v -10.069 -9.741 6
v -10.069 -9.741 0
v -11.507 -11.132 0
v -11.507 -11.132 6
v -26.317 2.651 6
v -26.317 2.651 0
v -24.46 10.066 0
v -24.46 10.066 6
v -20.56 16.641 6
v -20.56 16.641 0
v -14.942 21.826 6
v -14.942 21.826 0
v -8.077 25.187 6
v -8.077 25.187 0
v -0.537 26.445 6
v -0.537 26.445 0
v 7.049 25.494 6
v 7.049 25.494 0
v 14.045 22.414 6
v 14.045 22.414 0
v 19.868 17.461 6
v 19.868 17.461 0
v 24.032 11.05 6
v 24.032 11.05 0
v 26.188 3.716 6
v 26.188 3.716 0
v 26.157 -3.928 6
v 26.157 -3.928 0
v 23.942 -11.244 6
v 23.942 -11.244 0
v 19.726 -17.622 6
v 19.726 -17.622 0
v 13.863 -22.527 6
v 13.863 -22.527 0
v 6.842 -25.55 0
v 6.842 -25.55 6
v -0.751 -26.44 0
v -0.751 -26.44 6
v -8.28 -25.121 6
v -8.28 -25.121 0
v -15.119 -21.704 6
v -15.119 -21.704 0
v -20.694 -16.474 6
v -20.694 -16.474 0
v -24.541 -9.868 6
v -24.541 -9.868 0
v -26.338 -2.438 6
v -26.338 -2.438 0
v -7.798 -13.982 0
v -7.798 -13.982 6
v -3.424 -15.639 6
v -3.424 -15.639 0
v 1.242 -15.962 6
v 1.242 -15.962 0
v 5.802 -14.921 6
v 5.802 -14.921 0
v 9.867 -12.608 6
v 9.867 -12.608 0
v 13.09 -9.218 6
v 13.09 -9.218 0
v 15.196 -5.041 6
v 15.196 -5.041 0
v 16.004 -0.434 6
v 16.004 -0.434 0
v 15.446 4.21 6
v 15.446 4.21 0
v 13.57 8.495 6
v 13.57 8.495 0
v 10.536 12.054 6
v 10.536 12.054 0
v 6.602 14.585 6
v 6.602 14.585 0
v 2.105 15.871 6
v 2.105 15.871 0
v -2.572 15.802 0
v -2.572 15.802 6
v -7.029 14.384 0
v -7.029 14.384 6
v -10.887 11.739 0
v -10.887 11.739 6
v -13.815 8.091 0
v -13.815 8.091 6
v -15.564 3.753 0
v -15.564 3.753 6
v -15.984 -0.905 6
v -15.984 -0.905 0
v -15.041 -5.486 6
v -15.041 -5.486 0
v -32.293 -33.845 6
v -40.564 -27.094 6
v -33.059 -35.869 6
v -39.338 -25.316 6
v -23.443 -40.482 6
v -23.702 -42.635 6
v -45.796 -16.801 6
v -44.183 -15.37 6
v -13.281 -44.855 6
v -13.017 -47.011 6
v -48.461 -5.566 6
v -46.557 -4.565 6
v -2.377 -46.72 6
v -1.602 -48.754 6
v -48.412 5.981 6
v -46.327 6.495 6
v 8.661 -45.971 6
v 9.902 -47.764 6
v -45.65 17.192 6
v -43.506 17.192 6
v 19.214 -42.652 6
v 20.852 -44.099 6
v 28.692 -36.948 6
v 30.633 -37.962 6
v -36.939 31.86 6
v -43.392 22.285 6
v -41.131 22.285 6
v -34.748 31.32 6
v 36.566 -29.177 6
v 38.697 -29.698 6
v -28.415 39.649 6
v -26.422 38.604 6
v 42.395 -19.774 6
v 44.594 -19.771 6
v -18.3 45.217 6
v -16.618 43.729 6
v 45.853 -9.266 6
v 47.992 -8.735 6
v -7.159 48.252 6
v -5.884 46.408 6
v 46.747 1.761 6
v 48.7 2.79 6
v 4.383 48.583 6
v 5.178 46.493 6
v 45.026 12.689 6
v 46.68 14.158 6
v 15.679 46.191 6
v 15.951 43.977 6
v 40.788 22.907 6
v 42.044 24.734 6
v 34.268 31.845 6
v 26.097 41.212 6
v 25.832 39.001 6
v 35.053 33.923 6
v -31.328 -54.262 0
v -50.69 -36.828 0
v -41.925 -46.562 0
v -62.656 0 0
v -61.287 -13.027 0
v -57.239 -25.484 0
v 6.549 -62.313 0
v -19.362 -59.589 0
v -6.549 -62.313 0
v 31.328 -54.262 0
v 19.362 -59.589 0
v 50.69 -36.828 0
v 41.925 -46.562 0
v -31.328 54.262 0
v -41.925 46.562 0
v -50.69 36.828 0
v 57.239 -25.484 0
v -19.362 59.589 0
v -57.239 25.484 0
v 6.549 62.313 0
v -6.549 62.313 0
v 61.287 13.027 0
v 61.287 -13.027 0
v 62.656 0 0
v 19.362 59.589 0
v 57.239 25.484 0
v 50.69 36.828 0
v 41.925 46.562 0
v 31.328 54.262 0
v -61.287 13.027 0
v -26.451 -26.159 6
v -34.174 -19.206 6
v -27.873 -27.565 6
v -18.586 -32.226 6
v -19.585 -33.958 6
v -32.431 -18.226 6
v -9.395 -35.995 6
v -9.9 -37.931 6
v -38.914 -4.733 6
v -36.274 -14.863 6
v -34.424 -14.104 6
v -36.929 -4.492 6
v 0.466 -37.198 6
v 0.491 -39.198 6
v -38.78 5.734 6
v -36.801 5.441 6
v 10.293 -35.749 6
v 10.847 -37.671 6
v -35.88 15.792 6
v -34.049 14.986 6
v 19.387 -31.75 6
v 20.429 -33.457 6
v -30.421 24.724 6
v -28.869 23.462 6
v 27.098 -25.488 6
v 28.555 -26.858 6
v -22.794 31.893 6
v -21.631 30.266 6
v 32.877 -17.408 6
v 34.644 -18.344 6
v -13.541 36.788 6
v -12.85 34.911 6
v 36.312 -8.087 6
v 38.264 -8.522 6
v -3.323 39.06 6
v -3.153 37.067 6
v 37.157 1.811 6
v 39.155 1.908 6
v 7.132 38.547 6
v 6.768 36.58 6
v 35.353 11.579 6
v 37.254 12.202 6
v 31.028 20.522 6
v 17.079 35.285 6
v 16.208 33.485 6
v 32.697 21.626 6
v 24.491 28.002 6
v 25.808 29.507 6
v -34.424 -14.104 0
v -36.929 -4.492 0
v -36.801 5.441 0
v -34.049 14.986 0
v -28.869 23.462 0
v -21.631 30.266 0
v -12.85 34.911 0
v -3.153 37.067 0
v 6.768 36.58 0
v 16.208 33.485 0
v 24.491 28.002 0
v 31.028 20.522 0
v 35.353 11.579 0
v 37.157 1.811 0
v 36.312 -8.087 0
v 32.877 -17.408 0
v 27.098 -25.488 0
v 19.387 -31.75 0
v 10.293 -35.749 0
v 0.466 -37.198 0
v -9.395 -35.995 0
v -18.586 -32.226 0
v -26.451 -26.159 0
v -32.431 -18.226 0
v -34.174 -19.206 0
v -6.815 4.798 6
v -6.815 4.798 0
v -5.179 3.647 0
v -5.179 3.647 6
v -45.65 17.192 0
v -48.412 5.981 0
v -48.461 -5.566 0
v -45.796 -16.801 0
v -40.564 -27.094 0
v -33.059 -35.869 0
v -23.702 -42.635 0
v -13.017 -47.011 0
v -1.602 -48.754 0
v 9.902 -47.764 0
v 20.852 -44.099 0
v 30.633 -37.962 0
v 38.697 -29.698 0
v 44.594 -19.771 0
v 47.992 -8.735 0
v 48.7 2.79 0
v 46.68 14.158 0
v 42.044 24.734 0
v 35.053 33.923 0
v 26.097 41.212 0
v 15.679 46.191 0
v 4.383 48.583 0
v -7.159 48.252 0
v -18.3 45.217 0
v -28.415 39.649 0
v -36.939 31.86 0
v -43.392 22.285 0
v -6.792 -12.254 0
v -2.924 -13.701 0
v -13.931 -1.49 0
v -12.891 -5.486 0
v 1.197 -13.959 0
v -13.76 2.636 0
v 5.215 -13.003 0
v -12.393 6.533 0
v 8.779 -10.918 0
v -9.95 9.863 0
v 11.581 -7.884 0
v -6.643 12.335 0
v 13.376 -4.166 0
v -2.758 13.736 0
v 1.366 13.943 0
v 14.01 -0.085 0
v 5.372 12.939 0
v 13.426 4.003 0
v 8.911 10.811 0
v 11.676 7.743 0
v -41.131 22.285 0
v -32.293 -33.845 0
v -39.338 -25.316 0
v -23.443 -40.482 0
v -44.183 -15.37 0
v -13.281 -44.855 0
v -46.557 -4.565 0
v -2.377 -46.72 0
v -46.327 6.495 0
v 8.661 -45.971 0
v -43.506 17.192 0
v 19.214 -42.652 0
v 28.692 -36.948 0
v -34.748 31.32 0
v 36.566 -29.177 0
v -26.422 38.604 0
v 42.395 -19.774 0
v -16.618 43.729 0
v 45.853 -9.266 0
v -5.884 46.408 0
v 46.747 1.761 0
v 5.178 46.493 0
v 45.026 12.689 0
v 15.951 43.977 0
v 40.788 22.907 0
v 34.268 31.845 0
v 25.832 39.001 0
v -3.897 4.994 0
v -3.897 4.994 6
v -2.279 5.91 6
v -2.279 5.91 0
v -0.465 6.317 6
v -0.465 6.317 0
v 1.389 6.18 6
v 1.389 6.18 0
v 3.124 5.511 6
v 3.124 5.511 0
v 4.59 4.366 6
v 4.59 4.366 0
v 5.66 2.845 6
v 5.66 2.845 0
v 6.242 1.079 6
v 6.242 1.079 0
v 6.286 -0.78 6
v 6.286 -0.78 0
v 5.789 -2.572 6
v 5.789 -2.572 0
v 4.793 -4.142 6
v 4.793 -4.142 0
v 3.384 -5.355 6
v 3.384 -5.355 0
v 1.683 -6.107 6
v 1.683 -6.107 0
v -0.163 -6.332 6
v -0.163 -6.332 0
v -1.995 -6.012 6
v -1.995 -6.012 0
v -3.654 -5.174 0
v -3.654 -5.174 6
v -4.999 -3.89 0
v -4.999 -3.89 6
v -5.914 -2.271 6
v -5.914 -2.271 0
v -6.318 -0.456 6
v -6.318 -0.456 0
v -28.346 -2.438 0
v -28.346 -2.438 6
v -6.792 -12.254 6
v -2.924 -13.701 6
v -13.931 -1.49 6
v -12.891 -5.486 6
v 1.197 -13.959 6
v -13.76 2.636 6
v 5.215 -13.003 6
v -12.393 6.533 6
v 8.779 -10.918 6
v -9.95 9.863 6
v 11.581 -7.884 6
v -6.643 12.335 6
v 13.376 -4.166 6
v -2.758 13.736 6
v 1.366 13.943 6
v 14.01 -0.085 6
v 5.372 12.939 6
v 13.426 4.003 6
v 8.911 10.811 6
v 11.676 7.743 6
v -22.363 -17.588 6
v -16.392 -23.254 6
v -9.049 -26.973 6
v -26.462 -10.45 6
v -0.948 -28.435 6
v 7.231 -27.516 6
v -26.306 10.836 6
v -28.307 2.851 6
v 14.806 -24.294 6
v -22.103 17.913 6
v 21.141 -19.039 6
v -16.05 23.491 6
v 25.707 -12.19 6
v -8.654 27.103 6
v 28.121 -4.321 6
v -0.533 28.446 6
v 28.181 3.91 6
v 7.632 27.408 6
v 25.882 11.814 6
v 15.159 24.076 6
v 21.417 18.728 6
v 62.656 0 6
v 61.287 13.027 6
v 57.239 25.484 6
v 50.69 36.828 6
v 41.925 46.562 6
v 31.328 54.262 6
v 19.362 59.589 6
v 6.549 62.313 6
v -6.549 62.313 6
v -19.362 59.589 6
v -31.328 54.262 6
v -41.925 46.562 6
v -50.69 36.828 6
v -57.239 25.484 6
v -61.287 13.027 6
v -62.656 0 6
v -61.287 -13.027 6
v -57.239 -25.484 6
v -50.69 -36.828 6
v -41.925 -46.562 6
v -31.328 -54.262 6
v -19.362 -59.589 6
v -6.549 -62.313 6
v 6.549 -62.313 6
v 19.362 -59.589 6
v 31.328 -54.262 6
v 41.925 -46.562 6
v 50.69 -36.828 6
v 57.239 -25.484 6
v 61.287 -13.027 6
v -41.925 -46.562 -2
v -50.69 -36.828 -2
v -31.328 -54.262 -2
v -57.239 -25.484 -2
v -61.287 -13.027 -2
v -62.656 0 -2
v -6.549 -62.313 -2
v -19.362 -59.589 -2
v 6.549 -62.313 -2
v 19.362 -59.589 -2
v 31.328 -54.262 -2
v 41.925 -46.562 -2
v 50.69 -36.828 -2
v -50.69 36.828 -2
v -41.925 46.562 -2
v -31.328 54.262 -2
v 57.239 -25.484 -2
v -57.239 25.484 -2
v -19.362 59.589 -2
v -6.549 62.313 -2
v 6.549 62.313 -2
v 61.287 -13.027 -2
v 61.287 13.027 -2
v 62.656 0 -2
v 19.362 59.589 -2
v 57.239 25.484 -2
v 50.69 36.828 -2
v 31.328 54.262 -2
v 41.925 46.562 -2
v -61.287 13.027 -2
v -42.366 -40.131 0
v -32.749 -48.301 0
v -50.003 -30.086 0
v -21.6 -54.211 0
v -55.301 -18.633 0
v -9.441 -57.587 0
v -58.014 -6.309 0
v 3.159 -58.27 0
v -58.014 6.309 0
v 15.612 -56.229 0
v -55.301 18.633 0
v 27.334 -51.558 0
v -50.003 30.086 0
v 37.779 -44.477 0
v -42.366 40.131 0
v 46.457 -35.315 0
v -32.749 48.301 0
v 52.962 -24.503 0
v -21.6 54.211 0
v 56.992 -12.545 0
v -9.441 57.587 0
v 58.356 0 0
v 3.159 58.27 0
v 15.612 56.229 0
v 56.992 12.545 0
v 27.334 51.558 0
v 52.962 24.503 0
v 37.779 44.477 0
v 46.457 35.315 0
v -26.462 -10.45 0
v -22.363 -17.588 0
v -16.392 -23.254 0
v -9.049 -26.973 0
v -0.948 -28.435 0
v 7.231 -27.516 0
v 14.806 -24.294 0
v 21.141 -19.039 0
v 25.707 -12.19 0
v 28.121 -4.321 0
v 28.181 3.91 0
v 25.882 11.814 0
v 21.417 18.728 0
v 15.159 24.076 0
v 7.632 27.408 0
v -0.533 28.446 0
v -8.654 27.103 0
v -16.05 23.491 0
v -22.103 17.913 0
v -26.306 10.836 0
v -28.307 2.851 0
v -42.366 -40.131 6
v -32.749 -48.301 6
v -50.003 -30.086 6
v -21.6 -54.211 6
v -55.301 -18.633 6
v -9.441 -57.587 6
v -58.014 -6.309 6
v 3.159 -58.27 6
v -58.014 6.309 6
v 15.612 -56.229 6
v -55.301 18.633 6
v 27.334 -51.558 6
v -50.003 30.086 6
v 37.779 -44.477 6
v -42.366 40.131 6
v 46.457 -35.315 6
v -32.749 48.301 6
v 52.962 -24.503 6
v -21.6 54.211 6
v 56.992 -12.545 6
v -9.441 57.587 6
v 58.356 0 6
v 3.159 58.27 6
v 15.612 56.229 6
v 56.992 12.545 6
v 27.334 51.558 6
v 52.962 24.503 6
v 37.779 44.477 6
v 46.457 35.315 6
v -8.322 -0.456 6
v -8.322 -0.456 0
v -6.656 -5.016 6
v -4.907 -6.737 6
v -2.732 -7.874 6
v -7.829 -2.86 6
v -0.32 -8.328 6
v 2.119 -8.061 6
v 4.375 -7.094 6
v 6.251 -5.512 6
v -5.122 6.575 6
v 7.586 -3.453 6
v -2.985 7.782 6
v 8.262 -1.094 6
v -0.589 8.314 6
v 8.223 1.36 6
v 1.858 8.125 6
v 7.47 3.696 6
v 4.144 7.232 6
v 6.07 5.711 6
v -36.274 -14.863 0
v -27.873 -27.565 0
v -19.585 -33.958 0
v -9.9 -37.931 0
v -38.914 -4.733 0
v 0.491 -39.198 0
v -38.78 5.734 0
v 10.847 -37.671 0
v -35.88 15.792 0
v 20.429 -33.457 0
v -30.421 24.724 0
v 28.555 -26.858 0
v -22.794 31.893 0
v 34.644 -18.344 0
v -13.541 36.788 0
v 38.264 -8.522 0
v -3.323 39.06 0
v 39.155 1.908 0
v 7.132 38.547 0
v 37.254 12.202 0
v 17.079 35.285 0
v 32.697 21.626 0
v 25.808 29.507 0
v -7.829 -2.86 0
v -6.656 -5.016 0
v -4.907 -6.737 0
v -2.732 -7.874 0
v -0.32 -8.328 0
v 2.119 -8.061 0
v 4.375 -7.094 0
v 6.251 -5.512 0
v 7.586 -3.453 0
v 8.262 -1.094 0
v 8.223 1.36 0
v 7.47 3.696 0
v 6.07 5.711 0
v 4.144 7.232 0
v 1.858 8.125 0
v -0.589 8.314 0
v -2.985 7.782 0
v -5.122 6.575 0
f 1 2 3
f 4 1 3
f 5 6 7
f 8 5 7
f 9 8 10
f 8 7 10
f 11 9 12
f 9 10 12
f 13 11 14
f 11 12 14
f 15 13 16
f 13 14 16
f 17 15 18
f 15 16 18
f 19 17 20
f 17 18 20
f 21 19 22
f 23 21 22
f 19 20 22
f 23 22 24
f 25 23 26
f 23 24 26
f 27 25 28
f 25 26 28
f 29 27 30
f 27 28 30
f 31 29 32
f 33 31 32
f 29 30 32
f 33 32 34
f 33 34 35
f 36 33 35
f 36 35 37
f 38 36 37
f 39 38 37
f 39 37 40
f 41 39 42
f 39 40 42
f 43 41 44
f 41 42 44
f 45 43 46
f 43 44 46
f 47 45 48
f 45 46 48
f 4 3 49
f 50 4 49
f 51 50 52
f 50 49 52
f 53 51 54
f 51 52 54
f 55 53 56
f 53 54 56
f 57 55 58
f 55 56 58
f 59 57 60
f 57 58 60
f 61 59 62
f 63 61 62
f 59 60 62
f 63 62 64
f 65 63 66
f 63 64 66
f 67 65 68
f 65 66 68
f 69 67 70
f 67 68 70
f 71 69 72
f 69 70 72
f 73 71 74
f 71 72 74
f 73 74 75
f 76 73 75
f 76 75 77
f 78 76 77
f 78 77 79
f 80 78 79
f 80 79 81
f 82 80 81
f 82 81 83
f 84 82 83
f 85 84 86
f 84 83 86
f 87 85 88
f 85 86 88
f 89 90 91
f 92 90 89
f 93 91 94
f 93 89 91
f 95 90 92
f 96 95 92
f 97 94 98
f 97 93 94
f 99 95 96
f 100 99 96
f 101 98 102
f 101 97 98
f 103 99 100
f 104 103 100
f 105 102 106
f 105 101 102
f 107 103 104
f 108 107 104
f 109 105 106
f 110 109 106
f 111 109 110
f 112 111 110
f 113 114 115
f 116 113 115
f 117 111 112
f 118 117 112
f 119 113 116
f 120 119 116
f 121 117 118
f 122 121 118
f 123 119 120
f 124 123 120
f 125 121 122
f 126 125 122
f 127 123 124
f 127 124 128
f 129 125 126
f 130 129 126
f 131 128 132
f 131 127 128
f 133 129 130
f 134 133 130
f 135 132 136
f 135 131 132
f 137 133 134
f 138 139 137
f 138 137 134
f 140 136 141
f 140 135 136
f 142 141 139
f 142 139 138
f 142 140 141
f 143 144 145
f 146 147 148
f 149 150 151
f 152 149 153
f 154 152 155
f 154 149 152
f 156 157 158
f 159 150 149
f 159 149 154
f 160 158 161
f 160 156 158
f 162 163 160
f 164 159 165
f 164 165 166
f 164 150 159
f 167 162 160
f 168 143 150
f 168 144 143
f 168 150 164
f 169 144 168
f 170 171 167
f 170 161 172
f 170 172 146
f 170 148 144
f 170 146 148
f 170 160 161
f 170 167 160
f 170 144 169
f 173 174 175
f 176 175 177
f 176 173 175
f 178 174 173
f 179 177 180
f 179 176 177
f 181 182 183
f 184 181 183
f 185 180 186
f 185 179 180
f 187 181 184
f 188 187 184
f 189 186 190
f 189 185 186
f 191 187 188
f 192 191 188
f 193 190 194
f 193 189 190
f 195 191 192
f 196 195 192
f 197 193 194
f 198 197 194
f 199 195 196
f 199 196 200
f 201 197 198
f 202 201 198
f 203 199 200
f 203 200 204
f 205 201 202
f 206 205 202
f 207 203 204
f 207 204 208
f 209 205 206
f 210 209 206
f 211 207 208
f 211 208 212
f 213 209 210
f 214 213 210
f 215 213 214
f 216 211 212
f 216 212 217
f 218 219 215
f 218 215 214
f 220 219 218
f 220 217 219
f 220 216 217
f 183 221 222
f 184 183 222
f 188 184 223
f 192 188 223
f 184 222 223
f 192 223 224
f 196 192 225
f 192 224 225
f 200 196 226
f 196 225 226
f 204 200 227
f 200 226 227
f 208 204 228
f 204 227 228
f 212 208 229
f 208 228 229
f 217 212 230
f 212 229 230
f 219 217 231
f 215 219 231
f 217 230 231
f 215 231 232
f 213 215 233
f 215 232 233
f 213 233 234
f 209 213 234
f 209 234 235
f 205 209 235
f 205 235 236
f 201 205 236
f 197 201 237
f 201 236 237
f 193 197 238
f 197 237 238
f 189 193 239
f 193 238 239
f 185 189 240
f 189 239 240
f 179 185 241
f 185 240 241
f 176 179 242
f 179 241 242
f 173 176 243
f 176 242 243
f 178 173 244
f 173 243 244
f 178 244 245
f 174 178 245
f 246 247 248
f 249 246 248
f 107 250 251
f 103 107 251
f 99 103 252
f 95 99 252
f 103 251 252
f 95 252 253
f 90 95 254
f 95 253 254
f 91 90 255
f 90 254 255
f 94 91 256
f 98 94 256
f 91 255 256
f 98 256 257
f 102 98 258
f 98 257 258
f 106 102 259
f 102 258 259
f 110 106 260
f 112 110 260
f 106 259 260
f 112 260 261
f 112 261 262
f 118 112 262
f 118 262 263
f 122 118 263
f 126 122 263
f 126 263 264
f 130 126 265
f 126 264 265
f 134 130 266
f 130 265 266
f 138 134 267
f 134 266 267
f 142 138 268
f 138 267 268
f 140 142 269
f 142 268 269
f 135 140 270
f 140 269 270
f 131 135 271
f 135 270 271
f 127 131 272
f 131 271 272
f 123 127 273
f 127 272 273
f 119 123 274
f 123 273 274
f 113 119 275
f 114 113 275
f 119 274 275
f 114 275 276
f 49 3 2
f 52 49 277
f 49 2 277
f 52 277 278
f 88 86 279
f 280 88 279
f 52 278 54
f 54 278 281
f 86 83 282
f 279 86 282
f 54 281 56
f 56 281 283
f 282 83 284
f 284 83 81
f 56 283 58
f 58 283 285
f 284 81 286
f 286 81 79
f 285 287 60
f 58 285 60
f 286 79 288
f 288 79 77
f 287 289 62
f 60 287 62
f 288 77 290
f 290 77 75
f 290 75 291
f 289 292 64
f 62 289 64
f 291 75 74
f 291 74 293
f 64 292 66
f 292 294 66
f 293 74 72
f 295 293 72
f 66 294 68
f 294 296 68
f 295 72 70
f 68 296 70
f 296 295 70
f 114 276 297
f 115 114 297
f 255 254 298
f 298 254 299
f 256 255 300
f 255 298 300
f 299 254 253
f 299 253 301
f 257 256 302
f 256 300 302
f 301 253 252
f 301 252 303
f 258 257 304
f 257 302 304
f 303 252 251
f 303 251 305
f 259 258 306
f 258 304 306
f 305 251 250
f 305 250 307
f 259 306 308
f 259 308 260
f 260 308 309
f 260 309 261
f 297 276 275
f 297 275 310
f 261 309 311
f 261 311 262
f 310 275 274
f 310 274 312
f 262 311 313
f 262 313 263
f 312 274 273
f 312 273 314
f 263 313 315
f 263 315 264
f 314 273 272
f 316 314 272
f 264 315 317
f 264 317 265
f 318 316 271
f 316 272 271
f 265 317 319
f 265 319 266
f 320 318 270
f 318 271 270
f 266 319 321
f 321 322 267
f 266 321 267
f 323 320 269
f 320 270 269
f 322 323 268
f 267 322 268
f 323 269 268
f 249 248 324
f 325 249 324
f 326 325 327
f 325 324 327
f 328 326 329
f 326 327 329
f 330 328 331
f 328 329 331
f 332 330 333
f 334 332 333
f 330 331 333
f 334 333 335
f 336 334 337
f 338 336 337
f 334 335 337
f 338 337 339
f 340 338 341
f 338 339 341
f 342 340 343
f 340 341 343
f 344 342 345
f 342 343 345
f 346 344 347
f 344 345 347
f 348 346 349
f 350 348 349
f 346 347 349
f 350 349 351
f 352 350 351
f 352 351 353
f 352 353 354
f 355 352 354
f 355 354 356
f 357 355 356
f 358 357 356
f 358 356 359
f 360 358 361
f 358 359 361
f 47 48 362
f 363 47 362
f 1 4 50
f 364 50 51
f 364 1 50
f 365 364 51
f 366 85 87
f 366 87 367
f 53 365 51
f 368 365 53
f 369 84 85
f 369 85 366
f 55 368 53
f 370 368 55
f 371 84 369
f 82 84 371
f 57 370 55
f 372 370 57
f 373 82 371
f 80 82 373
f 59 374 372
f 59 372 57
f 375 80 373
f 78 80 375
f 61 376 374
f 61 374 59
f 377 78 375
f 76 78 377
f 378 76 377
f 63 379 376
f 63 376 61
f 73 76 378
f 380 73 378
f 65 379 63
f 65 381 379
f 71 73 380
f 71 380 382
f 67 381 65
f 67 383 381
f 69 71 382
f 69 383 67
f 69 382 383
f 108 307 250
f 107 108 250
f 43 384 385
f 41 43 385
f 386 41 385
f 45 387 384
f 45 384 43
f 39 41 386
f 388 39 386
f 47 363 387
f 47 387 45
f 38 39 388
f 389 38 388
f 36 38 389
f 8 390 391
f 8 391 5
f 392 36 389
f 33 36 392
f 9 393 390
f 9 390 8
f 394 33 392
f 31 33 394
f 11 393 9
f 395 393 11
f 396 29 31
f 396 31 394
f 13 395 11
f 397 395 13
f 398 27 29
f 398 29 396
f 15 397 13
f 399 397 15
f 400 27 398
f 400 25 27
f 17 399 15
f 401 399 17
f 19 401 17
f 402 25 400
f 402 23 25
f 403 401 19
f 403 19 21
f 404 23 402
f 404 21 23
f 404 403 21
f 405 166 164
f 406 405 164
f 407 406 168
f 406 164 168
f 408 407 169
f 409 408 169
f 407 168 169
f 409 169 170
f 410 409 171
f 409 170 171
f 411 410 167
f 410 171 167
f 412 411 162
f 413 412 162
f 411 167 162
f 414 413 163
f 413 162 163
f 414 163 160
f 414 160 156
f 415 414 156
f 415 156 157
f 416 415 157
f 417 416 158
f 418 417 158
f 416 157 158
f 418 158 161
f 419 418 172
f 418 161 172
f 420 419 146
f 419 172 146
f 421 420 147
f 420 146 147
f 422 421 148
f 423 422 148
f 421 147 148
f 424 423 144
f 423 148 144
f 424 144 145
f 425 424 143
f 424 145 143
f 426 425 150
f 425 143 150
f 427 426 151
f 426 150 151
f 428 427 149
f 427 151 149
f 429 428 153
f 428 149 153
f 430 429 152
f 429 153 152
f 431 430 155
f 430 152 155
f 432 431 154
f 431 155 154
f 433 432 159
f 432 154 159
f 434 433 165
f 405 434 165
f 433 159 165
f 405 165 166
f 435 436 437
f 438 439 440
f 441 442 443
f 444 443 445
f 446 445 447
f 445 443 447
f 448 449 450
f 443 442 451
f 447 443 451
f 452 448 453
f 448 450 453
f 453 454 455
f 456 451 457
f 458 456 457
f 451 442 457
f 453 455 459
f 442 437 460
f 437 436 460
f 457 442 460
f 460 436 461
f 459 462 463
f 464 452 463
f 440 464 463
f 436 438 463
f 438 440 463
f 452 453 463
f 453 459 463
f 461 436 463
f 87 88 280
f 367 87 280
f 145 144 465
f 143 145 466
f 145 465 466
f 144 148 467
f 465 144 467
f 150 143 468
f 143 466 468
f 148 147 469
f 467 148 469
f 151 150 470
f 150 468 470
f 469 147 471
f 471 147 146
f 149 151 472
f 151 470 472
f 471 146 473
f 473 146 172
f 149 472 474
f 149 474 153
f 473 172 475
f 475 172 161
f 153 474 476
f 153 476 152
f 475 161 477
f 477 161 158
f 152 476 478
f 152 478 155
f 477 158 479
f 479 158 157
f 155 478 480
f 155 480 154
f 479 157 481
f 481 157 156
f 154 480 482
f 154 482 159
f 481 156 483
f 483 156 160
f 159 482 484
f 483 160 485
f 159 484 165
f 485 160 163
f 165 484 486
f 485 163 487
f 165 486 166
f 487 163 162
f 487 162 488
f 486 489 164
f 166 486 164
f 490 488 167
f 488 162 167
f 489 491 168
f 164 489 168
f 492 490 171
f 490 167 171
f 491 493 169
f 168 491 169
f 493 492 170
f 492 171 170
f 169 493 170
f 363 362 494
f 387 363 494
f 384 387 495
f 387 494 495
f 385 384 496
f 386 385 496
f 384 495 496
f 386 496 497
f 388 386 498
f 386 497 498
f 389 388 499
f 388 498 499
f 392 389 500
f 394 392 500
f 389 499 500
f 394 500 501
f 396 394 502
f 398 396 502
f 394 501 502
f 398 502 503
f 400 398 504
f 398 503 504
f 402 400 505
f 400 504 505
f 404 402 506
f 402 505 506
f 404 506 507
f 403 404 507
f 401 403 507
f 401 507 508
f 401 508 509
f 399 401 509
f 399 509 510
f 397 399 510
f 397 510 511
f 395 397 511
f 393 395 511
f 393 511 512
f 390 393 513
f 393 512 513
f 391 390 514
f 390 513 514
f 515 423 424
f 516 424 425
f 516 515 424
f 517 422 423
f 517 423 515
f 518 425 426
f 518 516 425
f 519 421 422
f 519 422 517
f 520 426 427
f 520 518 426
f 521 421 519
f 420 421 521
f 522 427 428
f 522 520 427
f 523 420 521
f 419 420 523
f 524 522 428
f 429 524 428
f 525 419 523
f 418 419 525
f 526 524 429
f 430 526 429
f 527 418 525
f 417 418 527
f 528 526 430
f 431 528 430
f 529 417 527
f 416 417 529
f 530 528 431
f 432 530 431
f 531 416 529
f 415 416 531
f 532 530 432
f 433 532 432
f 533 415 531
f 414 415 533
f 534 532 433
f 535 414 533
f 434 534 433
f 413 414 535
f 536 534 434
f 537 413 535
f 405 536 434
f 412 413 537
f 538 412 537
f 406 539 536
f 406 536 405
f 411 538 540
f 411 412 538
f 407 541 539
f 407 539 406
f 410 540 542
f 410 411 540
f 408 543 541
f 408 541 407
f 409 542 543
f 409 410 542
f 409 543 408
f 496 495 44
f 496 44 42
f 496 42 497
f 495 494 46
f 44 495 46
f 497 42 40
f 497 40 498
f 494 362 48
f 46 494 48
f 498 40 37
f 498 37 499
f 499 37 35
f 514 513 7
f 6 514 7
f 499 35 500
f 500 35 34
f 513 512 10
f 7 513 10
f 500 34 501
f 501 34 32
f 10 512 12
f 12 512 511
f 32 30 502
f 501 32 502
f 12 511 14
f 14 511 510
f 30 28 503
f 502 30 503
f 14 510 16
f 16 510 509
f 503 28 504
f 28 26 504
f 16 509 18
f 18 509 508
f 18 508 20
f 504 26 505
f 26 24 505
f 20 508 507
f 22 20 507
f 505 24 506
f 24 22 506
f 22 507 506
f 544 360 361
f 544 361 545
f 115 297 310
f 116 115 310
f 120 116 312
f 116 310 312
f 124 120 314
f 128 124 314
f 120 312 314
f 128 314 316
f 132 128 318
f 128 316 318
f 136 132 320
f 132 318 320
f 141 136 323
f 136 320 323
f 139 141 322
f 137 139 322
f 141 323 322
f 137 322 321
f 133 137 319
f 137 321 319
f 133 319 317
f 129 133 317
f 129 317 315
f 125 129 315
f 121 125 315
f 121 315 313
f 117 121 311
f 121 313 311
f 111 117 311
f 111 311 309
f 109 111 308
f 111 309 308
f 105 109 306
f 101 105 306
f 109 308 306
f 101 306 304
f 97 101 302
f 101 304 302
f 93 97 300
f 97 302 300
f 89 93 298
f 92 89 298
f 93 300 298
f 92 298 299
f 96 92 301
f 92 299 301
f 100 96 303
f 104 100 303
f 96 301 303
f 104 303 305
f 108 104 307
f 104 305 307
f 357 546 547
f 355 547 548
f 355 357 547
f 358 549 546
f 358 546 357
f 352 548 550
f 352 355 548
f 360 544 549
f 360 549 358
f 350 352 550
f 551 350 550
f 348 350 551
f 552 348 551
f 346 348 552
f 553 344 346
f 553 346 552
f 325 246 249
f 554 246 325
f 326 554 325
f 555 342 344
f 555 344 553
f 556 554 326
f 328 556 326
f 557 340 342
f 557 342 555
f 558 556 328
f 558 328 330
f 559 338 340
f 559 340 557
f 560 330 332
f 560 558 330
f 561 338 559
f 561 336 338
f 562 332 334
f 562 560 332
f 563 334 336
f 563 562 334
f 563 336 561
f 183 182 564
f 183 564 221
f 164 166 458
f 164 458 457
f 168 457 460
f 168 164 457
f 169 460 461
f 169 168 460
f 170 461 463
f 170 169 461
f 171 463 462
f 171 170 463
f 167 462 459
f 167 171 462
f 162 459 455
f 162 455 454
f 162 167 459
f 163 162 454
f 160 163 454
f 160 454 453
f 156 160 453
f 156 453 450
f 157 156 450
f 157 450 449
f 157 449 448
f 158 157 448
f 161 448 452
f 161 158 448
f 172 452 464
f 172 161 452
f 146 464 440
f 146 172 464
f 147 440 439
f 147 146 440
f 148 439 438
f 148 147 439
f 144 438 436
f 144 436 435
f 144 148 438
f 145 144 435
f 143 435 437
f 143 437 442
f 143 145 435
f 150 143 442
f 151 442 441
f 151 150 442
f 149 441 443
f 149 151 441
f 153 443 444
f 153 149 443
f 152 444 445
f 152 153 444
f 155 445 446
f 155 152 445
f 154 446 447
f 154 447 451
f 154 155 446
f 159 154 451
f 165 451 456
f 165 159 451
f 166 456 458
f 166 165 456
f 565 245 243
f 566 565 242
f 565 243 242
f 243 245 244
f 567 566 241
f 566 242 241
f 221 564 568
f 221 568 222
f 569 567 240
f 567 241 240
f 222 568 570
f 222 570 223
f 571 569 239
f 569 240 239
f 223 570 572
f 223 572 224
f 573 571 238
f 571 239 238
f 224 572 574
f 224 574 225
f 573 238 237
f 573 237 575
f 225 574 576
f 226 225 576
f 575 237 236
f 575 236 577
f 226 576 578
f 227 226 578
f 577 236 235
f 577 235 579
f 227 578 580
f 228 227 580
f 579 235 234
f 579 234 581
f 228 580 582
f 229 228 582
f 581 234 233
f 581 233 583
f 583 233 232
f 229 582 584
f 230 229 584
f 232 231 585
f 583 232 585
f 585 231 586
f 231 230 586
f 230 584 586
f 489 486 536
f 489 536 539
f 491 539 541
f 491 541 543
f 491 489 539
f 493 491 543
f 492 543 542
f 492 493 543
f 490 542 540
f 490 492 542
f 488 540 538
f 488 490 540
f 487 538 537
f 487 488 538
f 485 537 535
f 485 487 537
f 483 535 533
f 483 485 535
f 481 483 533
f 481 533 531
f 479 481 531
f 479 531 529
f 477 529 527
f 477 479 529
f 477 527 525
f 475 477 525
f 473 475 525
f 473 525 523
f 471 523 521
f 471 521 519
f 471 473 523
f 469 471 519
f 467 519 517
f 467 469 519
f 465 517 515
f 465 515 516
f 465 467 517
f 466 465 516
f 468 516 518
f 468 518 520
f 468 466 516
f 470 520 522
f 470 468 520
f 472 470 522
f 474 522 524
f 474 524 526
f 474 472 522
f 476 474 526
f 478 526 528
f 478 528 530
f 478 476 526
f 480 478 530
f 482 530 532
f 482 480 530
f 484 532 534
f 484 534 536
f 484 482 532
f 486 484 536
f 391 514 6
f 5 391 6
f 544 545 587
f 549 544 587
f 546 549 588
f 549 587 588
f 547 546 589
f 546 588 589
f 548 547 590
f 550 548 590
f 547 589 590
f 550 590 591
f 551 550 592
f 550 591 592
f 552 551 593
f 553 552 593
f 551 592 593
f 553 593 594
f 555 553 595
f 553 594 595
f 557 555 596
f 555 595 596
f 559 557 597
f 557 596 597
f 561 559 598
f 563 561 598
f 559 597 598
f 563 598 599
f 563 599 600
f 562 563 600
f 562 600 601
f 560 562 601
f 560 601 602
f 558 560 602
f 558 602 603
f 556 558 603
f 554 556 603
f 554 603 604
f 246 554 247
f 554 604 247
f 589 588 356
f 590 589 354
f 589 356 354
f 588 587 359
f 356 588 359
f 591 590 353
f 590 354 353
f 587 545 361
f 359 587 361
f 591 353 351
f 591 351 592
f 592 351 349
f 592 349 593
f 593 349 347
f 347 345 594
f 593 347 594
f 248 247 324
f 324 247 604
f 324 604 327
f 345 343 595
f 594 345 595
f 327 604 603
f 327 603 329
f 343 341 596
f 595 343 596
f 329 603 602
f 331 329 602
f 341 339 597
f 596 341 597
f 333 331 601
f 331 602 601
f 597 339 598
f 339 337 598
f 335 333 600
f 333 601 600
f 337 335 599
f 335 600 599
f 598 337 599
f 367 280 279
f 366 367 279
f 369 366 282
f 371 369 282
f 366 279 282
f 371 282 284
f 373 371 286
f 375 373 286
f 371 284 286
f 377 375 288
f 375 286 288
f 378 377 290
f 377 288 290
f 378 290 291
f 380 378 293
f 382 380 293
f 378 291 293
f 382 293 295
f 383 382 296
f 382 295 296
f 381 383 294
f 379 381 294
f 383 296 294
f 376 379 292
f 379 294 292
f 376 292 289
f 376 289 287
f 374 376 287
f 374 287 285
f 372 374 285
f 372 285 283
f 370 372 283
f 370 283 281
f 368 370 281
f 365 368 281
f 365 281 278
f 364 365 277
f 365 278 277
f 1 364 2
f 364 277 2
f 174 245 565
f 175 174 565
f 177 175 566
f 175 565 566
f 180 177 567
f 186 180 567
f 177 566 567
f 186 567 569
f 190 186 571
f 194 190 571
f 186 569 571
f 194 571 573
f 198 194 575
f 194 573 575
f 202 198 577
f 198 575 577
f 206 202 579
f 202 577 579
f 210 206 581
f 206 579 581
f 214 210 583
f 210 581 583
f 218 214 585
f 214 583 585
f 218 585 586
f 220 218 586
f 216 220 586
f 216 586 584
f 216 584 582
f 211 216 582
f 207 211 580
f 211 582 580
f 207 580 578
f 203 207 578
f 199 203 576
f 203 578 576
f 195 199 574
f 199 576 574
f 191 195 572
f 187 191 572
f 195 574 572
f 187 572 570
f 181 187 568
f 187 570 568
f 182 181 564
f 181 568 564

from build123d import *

# Parameters (mm, degrees)
F1_DEPTH = 6
F0_R     = 62.6558654543
F0_R_2   = 58.3558654543
F2_R     = 62.6558654543
F3_DEPTH = 2


with BuildPart() as f1:
    # F0 (on Top) → F1 (new body)
    with BuildSketch(Plane.XY):
        with BuildLine():
            Line((-43.5062726708, 17.1923115849), (-45.6499275725, 17.1923115849))
            ThreePointArc((-45.6499275725, 17.1923115849), (44.5938282764, -19.7707345503), (-43.392231874, 22.2846511751))
            Line((-43.392231874, 22.2846511751), (-41.1310790199, 22.2846511751))
            ThreePointArc((-41.1310790199, 22.2846511751), (42.3952038081, -19.7741759224), (-43.5062726708, 17.1923115849))
        make_face()
    extrude(amount=F1_DEPTH)


with BuildPart() as f1b:
    # F0 (on Top) → F1, piece 2 (new body)
    with BuildSketch(Plane.XY):
        Circle(F0_R)
        Circle(F0_R_2, mode=Mode.SUBTRACT)
    extrude(amount=F1_DEPTH)


with BuildPart() as f1c:
    # F0 (on Top) → F1, piece 3 (new body)
    with BuildSketch(Plane.XY):
        with BuildLine():
            Line((-32.4305662193, -18.2259800495), (-34.1740896291, -19.2058403045))
            ThreePointArc((-34.1740896291, -19.2058403045), (35.2911157623, 17.0666297797), (-36.2743942596, -14.862739481))
            Line((-36.2743942596, -14.862739481), (-34.4237156824, -14.104459319))
            ThreePointArc((-34.4237156824, -14.104459319), (33.4906029422, 16.1959096267), (-32.4305662193, -18.2259800495))
        make_face()
    extrude(amount=F1_DEPTH)


with BuildPart() as f1d:
    # F0 (on Top) → F1, piece 4 (new body)
    with BuildSketch(Plane.XY):
        with BuildLine():
            Line((-26.3380359585, -2.4378048256), (-28.3459802776, -2.4378048256))
            ThreePointArc((-28.3459802776, -2.4378048256), (28.4498566189, -0.2077224752), (-28.3073615488, 2.851450931))
            Line((-28.3073615488, 2.851450931), (-26.317431868, 2.6510017711))
            ThreePointArc((-26.317431868, 2.6510017711), (26.4503981284, -0.1070951284), (-26.3380359585, -2.4378048256))
        make_face()
    extrude(amount=F1_DEPTH)


with BuildPart() as f1e:
    # F0 (on Top) → F1, piece 5 (new body)
    with BuildSketch(Plane.XY):
        with BuildLine():
            Line((-10.069114881, -9.7412249533), (-11.5065388559, -11.131840758))
            ThreePointArc((-11.5065388559, -11.131840758), (13.5703952835, 8.4948623858), (-15.0405875779, -5.4862592369))
            Line((-15.0405875779, -5.4862592369), (-12.8910627049, -5.4862592369))
            ThreePointArc((-12.8910627049, -5.4862592369), (11.6755566037, 7.7433788537), (-10.069114881, -9.7412249533))
        make_face()
    extrude(amount=F1_DEPTH)


with BuildPart() as f1f:
    # F0 (on Top) → F1, piece 6 (new body)
    with BuildSketch(Plane.XY):
        with BuildLine():
            ThreePointArc((-5.1794242353, 3.646916388), (6.1038145867, -1.6940726198), (-6.3181195634, -0.4558505607))
            Line((-6.3181195634, -0.4558505607), (-8.3220673289, -0.4558505607))
            ThreePointArc((-8.3220673289, -0.4558505607), (8.0113822453, -2.2983382867), (-6.8147194565, 4.7983542063))
            Line((-6.8147194565, 4.7983542063), (-5.1794242353, 3.646916388))
        make_face()
    extrude(amount=F1_DEPTH)


with BuildPart() as f3:
    # F2 (on Top) → F3 (new body)
    with BuildSketch(Plane.XY):
        Circle(F2_R)
    extrude(amount=-F3_DEPTH)


solid = Compound([f1.part, f1b.part, f1c.part, f1d.part, f1e.part, f1f.part, f3.part])
